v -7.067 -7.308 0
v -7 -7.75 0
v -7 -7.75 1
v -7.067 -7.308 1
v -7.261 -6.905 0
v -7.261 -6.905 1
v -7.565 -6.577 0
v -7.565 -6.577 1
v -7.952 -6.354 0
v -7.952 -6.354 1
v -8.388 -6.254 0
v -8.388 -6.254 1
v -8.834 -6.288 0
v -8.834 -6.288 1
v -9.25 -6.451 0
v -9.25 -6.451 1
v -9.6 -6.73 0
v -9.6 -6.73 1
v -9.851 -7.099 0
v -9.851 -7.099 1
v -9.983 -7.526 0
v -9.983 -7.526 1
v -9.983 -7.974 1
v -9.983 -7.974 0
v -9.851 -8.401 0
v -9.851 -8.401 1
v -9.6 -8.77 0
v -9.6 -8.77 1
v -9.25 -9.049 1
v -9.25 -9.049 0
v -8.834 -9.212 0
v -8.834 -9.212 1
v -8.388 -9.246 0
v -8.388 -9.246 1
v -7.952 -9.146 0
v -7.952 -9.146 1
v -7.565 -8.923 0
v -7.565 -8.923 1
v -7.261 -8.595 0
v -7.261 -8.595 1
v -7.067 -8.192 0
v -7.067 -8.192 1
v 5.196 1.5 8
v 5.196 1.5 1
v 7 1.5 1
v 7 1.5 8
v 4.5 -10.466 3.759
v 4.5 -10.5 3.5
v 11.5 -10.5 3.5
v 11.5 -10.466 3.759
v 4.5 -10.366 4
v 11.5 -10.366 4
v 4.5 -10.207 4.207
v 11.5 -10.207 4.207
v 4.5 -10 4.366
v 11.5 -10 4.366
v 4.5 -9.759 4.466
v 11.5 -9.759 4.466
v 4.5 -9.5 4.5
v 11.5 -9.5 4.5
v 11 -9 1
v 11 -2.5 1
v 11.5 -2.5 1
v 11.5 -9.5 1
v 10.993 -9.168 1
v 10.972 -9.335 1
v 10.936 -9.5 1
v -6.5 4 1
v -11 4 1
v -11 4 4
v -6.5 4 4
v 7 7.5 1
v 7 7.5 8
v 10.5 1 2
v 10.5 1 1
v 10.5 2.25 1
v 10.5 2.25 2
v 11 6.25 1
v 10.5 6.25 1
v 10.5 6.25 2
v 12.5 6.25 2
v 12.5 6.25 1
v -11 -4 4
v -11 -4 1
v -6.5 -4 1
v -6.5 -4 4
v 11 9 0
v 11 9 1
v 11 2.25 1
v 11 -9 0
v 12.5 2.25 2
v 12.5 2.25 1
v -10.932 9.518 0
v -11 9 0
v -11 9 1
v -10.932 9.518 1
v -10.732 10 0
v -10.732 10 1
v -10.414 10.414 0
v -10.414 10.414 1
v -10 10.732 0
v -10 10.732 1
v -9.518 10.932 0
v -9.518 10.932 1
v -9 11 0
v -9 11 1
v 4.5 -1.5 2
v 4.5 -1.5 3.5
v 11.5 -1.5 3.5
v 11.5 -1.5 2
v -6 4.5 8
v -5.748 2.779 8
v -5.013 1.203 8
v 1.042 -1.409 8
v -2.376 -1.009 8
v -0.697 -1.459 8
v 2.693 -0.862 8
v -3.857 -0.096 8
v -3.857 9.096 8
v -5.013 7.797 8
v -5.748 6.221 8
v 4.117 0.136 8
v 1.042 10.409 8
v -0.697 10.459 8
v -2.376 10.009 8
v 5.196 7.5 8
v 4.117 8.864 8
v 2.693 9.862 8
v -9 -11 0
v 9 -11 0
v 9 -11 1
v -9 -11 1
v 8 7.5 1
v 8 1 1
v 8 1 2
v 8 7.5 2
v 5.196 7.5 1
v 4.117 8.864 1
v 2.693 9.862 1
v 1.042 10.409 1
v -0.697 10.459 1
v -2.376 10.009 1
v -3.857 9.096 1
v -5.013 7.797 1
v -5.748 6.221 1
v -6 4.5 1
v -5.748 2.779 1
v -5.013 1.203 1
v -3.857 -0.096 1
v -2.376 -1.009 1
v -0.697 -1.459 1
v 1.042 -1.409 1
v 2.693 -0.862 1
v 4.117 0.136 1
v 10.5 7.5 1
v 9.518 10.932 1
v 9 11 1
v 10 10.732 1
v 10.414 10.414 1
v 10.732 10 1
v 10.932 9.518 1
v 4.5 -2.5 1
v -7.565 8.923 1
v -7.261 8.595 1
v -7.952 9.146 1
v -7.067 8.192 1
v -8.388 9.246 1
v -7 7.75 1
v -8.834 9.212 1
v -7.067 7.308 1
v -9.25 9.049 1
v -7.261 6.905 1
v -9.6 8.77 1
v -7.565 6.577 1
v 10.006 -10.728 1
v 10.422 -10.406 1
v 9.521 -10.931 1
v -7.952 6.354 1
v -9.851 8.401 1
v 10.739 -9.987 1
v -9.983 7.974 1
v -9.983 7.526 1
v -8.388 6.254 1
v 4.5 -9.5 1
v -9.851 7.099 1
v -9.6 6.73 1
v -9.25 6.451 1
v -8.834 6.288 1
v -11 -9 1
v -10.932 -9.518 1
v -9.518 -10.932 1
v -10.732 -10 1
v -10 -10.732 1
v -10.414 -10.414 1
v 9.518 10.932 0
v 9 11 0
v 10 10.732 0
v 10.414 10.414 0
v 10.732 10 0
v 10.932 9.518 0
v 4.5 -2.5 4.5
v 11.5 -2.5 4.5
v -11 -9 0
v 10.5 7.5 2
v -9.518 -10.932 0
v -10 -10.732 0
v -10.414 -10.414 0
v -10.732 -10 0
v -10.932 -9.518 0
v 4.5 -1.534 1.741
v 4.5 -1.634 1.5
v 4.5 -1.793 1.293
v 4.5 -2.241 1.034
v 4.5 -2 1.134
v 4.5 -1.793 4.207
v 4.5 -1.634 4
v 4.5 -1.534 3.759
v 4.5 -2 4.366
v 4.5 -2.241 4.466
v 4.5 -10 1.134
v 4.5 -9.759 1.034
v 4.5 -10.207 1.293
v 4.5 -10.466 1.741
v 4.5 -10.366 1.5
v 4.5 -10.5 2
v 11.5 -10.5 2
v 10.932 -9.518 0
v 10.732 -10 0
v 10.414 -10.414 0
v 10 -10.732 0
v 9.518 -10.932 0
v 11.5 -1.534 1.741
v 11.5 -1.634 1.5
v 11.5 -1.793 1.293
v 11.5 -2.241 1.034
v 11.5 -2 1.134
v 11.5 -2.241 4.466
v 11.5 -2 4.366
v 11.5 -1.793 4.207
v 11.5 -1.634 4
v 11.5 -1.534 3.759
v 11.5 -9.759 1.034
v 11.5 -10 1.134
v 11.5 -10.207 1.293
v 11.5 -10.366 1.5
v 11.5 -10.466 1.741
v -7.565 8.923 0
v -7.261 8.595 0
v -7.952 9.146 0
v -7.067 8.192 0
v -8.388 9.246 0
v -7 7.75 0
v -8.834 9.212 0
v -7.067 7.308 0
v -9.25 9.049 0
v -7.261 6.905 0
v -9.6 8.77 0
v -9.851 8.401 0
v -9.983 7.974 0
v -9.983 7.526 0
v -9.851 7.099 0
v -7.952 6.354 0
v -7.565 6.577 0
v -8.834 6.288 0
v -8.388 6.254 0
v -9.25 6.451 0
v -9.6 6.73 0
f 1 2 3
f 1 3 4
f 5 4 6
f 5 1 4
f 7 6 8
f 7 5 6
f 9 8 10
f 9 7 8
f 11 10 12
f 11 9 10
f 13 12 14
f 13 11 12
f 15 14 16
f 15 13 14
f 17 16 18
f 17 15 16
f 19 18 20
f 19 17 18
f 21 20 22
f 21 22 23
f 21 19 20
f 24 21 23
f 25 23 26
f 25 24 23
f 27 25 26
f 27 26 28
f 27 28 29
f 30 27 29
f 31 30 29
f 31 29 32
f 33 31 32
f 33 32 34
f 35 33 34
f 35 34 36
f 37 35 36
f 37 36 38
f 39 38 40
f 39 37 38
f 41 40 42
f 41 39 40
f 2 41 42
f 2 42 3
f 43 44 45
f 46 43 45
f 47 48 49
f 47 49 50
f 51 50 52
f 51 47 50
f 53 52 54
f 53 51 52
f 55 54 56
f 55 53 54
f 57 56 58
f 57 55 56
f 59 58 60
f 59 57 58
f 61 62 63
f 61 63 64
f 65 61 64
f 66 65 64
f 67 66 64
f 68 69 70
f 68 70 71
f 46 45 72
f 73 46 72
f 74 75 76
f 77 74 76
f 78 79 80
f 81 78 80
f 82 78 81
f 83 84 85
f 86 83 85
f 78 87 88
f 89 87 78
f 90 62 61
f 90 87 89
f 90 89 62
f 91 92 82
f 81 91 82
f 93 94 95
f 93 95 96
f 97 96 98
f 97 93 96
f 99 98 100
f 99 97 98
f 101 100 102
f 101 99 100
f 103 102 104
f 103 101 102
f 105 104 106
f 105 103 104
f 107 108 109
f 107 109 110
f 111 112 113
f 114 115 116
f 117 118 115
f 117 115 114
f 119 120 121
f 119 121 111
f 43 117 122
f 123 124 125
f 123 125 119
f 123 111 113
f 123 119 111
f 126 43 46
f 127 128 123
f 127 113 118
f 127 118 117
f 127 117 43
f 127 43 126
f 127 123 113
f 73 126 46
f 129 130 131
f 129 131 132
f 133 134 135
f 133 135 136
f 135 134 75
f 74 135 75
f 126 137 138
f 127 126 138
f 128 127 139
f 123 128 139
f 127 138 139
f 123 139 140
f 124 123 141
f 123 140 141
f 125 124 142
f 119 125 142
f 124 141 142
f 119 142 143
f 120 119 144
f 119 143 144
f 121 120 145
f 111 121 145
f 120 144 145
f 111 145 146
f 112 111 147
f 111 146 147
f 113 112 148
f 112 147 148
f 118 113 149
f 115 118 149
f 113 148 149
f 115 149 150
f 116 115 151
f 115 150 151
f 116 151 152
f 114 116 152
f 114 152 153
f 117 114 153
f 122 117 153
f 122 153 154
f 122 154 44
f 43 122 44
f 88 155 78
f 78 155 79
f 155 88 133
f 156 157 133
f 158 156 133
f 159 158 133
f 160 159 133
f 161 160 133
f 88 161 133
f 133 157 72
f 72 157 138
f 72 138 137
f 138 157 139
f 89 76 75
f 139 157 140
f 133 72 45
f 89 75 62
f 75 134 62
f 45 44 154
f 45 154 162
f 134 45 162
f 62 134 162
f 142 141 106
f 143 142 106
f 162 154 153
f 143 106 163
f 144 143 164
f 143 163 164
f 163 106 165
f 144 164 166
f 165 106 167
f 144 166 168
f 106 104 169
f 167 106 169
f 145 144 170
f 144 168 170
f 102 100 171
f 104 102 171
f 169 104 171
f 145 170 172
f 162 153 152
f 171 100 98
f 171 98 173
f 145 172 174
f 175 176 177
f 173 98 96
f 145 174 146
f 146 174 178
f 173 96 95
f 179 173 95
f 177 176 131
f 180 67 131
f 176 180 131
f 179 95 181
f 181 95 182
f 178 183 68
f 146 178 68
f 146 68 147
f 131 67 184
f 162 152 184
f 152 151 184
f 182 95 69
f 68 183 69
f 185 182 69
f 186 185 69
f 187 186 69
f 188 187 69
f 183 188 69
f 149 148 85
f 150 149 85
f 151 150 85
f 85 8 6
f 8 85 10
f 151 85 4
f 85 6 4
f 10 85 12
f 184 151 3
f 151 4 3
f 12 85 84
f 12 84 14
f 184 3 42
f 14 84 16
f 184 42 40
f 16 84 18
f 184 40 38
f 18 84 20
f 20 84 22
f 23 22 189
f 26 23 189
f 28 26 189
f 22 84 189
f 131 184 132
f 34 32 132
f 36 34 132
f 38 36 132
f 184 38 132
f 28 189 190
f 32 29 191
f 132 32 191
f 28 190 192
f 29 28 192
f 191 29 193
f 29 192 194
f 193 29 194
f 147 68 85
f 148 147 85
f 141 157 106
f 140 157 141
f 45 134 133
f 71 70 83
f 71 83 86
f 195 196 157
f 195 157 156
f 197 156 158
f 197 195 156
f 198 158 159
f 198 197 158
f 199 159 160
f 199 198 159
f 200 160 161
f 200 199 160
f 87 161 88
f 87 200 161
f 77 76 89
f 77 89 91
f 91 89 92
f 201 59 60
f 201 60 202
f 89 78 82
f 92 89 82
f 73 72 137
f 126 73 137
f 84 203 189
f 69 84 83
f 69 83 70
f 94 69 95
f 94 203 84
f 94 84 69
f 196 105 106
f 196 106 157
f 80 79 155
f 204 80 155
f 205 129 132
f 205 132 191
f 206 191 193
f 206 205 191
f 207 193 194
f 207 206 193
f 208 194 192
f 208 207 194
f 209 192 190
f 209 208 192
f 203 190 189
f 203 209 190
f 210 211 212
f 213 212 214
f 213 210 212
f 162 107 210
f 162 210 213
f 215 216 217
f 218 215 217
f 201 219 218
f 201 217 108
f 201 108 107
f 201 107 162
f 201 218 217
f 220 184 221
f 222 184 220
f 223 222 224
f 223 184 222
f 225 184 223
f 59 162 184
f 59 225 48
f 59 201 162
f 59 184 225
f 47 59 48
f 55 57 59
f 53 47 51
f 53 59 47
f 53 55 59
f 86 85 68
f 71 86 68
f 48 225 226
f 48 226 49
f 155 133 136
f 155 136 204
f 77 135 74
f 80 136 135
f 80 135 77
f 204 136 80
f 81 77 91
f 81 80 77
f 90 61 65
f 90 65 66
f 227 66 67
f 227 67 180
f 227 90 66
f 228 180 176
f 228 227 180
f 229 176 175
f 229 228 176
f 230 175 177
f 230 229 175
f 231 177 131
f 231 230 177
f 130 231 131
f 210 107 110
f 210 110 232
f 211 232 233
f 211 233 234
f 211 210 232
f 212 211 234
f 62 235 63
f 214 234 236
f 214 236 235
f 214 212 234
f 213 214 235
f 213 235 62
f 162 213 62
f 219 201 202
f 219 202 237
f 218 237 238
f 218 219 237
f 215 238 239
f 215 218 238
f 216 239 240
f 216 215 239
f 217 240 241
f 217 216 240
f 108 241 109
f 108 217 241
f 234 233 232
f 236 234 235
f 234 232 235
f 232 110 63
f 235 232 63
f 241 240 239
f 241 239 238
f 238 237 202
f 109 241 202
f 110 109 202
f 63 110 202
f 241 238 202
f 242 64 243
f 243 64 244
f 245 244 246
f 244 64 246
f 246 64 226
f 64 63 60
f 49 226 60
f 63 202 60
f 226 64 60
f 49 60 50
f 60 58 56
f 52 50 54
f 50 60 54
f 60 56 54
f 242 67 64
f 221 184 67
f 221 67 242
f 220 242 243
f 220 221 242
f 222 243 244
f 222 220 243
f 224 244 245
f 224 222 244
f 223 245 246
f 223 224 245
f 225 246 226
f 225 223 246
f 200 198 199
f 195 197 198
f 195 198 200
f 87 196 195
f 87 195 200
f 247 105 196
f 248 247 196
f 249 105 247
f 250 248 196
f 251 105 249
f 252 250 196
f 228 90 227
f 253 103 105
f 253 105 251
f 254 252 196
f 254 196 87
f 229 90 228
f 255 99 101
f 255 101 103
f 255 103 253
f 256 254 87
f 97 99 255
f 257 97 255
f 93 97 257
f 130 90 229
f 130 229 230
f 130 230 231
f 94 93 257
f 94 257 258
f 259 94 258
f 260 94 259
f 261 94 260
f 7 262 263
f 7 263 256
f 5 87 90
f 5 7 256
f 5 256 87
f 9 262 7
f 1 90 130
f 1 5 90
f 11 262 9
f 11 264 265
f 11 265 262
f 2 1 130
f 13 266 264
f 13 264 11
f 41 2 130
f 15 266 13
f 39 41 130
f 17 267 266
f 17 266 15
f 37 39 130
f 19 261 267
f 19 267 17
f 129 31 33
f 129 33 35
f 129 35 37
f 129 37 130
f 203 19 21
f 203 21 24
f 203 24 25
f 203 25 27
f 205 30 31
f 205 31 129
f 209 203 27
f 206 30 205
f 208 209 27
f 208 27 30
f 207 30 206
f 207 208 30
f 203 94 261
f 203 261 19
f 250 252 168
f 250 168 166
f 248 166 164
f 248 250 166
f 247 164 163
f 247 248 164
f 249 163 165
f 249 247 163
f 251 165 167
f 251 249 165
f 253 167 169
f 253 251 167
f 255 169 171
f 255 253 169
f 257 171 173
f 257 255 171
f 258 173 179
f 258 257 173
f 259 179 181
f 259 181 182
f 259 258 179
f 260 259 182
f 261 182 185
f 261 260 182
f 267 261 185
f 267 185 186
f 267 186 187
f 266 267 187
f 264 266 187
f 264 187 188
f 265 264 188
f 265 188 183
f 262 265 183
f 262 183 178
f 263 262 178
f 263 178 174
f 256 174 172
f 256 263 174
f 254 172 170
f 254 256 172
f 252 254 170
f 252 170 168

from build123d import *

# Parameters (mm, degrees)
SKETCH1_R                = 1.5
BOSS_EXTRUDE1_DEPTH      = 1
SKETCH2_W                = 4.5
SKETCH2_H                = 8
BOSS_EXTRUDE2_DEPTH      = 3
BOSS_EXTRUDE3_DEPTH      = 7
BOSS_EXTRUDE4_DEPTH      = 0.5
BOSS_EXTRUDE4_DEPTH_BACK = 6.5
SKETCH5_W                = 2.5
SKETCH5_H                = 6.5
SKETCH5_W_2              = 2
SKETCH5_H_2              = 4
BOSS_EXTRUDE5_DEPTH      = 1


with BuildPart() as part:
    # Sketch1 → Boss-Extrude1 (new body)
    with BuildSketch(Plane(origin=(0, 0, 0), x_dir=(0, 1, 0), z_dir=(0, 0, 1))):
        with BuildLine():
            Line((-9, 11), (9, 11))
            ThreePointArc((9, 11), (10.414213562, 10.414213562), (11, 9))
            Line((11, 9), (11, -9))
            ThreePointArc((11, -9), (10.414213562, -10.414213562), (9, -11))
            Line((9, -11), (-9, -11))
            ThreePointArc((-9, -11), (-10.414213562, -10.414213562), (-11, -9))
            Line((-11, -9), (-11, 9))
            ThreePointArc((-11, 9), (-10.414213562, 10.414213562), (-9, 11))
        make_face()
        with Locations(Location((-7.75, 8.5, 0), (0, 0, 270))):
            Circle(SKETCH1_R, mode=Mode.SUBTRACT)
        with Locations(Location((7.75, 8.5, 0), (0, 0, 270))):
            Circle(SKETCH1_R, mode=Mode.SUBTRACT)
    extrude(amount=BOSS_EXTRUDE1_DEPTH)

    # Sketch2 → Boss-Extrude2 (add)
    with BuildSketch(Plane.XY.offset(1)):
        with Locations((-8.75, 0)):
            Rectangle(SKETCH2_W, SKETCH2_H)
    extrude(amount=BOSS_EXTRUDE2_DEPTH)

    # Sketch3 → Boss-Extrude3 (add)
    with BuildSketch(Plane.XY.offset(1)):
        with BuildLine():
            Line((7, 7.5), (5.196152423, 7.5))
            ThreePointArc((5.196152423, 7.5), (-6, 4.5), (5.196152423, 1.5))
            Line((5.196152423, 1.5), (7, 1.5))
            Line((7, 1.5), (7, 7.5))
        make_face()
    extrude(amount=BOSS_EXTRUDE3_DEPTH)

    # Sketch4 → Boss-Extrude4 (add, two sides: drawn at the far end of the back side and taken through both)
    with BuildSketch(Plane.YZ.offset(11).offset(-BOSS_EXTRUDE4_DEPTH_BACK)):
        with BuildLine():
            Line((-9.5, 4.5), (-2.5, 4.5))
            ThreePointArc((-2.5, 4.5), (-1.792893219, 4.207106781), (-1.5, 3.5))
            Line((-1.5, 3.5), (-1.5, 2))
            ThreePointArc((-1.5, 2), (-1.792893219, 1.292893219), (-2.5, 1))
            Line((-2.5, 1), (-9.5, 1))
            ThreePointArc((-9.5, 1), (-10.207106781, 1.292893219), (-10.5, 2))
            Line((-10.5, 2), (-10.5, 3.5))
            ThreePointArc((-10.5, 3.5), (-10.207106781, 4.207106781), (-9.5, 4.5))
        make_face()
    extrude(amount=BOSS_EXTRUDE4_DEPTH + BOSS_EXTRUDE4_DEPTH_BACK)

    # Sketch5 → Boss-Extrude5 (add)
    with BuildSketch(Plane.XY.offset(1)):
        with Locations((9.25, 4.25)):
            Rectangle(SKETCH5_W, SKETCH5_H)
        with Locations((11.5, 4.25)):
            Rectangle(SKETCH5_W_2, SKETCH5_H_2)
    extrude(amount=BOSS_EXTRUDE5_DEPTH)


solid = part.part
